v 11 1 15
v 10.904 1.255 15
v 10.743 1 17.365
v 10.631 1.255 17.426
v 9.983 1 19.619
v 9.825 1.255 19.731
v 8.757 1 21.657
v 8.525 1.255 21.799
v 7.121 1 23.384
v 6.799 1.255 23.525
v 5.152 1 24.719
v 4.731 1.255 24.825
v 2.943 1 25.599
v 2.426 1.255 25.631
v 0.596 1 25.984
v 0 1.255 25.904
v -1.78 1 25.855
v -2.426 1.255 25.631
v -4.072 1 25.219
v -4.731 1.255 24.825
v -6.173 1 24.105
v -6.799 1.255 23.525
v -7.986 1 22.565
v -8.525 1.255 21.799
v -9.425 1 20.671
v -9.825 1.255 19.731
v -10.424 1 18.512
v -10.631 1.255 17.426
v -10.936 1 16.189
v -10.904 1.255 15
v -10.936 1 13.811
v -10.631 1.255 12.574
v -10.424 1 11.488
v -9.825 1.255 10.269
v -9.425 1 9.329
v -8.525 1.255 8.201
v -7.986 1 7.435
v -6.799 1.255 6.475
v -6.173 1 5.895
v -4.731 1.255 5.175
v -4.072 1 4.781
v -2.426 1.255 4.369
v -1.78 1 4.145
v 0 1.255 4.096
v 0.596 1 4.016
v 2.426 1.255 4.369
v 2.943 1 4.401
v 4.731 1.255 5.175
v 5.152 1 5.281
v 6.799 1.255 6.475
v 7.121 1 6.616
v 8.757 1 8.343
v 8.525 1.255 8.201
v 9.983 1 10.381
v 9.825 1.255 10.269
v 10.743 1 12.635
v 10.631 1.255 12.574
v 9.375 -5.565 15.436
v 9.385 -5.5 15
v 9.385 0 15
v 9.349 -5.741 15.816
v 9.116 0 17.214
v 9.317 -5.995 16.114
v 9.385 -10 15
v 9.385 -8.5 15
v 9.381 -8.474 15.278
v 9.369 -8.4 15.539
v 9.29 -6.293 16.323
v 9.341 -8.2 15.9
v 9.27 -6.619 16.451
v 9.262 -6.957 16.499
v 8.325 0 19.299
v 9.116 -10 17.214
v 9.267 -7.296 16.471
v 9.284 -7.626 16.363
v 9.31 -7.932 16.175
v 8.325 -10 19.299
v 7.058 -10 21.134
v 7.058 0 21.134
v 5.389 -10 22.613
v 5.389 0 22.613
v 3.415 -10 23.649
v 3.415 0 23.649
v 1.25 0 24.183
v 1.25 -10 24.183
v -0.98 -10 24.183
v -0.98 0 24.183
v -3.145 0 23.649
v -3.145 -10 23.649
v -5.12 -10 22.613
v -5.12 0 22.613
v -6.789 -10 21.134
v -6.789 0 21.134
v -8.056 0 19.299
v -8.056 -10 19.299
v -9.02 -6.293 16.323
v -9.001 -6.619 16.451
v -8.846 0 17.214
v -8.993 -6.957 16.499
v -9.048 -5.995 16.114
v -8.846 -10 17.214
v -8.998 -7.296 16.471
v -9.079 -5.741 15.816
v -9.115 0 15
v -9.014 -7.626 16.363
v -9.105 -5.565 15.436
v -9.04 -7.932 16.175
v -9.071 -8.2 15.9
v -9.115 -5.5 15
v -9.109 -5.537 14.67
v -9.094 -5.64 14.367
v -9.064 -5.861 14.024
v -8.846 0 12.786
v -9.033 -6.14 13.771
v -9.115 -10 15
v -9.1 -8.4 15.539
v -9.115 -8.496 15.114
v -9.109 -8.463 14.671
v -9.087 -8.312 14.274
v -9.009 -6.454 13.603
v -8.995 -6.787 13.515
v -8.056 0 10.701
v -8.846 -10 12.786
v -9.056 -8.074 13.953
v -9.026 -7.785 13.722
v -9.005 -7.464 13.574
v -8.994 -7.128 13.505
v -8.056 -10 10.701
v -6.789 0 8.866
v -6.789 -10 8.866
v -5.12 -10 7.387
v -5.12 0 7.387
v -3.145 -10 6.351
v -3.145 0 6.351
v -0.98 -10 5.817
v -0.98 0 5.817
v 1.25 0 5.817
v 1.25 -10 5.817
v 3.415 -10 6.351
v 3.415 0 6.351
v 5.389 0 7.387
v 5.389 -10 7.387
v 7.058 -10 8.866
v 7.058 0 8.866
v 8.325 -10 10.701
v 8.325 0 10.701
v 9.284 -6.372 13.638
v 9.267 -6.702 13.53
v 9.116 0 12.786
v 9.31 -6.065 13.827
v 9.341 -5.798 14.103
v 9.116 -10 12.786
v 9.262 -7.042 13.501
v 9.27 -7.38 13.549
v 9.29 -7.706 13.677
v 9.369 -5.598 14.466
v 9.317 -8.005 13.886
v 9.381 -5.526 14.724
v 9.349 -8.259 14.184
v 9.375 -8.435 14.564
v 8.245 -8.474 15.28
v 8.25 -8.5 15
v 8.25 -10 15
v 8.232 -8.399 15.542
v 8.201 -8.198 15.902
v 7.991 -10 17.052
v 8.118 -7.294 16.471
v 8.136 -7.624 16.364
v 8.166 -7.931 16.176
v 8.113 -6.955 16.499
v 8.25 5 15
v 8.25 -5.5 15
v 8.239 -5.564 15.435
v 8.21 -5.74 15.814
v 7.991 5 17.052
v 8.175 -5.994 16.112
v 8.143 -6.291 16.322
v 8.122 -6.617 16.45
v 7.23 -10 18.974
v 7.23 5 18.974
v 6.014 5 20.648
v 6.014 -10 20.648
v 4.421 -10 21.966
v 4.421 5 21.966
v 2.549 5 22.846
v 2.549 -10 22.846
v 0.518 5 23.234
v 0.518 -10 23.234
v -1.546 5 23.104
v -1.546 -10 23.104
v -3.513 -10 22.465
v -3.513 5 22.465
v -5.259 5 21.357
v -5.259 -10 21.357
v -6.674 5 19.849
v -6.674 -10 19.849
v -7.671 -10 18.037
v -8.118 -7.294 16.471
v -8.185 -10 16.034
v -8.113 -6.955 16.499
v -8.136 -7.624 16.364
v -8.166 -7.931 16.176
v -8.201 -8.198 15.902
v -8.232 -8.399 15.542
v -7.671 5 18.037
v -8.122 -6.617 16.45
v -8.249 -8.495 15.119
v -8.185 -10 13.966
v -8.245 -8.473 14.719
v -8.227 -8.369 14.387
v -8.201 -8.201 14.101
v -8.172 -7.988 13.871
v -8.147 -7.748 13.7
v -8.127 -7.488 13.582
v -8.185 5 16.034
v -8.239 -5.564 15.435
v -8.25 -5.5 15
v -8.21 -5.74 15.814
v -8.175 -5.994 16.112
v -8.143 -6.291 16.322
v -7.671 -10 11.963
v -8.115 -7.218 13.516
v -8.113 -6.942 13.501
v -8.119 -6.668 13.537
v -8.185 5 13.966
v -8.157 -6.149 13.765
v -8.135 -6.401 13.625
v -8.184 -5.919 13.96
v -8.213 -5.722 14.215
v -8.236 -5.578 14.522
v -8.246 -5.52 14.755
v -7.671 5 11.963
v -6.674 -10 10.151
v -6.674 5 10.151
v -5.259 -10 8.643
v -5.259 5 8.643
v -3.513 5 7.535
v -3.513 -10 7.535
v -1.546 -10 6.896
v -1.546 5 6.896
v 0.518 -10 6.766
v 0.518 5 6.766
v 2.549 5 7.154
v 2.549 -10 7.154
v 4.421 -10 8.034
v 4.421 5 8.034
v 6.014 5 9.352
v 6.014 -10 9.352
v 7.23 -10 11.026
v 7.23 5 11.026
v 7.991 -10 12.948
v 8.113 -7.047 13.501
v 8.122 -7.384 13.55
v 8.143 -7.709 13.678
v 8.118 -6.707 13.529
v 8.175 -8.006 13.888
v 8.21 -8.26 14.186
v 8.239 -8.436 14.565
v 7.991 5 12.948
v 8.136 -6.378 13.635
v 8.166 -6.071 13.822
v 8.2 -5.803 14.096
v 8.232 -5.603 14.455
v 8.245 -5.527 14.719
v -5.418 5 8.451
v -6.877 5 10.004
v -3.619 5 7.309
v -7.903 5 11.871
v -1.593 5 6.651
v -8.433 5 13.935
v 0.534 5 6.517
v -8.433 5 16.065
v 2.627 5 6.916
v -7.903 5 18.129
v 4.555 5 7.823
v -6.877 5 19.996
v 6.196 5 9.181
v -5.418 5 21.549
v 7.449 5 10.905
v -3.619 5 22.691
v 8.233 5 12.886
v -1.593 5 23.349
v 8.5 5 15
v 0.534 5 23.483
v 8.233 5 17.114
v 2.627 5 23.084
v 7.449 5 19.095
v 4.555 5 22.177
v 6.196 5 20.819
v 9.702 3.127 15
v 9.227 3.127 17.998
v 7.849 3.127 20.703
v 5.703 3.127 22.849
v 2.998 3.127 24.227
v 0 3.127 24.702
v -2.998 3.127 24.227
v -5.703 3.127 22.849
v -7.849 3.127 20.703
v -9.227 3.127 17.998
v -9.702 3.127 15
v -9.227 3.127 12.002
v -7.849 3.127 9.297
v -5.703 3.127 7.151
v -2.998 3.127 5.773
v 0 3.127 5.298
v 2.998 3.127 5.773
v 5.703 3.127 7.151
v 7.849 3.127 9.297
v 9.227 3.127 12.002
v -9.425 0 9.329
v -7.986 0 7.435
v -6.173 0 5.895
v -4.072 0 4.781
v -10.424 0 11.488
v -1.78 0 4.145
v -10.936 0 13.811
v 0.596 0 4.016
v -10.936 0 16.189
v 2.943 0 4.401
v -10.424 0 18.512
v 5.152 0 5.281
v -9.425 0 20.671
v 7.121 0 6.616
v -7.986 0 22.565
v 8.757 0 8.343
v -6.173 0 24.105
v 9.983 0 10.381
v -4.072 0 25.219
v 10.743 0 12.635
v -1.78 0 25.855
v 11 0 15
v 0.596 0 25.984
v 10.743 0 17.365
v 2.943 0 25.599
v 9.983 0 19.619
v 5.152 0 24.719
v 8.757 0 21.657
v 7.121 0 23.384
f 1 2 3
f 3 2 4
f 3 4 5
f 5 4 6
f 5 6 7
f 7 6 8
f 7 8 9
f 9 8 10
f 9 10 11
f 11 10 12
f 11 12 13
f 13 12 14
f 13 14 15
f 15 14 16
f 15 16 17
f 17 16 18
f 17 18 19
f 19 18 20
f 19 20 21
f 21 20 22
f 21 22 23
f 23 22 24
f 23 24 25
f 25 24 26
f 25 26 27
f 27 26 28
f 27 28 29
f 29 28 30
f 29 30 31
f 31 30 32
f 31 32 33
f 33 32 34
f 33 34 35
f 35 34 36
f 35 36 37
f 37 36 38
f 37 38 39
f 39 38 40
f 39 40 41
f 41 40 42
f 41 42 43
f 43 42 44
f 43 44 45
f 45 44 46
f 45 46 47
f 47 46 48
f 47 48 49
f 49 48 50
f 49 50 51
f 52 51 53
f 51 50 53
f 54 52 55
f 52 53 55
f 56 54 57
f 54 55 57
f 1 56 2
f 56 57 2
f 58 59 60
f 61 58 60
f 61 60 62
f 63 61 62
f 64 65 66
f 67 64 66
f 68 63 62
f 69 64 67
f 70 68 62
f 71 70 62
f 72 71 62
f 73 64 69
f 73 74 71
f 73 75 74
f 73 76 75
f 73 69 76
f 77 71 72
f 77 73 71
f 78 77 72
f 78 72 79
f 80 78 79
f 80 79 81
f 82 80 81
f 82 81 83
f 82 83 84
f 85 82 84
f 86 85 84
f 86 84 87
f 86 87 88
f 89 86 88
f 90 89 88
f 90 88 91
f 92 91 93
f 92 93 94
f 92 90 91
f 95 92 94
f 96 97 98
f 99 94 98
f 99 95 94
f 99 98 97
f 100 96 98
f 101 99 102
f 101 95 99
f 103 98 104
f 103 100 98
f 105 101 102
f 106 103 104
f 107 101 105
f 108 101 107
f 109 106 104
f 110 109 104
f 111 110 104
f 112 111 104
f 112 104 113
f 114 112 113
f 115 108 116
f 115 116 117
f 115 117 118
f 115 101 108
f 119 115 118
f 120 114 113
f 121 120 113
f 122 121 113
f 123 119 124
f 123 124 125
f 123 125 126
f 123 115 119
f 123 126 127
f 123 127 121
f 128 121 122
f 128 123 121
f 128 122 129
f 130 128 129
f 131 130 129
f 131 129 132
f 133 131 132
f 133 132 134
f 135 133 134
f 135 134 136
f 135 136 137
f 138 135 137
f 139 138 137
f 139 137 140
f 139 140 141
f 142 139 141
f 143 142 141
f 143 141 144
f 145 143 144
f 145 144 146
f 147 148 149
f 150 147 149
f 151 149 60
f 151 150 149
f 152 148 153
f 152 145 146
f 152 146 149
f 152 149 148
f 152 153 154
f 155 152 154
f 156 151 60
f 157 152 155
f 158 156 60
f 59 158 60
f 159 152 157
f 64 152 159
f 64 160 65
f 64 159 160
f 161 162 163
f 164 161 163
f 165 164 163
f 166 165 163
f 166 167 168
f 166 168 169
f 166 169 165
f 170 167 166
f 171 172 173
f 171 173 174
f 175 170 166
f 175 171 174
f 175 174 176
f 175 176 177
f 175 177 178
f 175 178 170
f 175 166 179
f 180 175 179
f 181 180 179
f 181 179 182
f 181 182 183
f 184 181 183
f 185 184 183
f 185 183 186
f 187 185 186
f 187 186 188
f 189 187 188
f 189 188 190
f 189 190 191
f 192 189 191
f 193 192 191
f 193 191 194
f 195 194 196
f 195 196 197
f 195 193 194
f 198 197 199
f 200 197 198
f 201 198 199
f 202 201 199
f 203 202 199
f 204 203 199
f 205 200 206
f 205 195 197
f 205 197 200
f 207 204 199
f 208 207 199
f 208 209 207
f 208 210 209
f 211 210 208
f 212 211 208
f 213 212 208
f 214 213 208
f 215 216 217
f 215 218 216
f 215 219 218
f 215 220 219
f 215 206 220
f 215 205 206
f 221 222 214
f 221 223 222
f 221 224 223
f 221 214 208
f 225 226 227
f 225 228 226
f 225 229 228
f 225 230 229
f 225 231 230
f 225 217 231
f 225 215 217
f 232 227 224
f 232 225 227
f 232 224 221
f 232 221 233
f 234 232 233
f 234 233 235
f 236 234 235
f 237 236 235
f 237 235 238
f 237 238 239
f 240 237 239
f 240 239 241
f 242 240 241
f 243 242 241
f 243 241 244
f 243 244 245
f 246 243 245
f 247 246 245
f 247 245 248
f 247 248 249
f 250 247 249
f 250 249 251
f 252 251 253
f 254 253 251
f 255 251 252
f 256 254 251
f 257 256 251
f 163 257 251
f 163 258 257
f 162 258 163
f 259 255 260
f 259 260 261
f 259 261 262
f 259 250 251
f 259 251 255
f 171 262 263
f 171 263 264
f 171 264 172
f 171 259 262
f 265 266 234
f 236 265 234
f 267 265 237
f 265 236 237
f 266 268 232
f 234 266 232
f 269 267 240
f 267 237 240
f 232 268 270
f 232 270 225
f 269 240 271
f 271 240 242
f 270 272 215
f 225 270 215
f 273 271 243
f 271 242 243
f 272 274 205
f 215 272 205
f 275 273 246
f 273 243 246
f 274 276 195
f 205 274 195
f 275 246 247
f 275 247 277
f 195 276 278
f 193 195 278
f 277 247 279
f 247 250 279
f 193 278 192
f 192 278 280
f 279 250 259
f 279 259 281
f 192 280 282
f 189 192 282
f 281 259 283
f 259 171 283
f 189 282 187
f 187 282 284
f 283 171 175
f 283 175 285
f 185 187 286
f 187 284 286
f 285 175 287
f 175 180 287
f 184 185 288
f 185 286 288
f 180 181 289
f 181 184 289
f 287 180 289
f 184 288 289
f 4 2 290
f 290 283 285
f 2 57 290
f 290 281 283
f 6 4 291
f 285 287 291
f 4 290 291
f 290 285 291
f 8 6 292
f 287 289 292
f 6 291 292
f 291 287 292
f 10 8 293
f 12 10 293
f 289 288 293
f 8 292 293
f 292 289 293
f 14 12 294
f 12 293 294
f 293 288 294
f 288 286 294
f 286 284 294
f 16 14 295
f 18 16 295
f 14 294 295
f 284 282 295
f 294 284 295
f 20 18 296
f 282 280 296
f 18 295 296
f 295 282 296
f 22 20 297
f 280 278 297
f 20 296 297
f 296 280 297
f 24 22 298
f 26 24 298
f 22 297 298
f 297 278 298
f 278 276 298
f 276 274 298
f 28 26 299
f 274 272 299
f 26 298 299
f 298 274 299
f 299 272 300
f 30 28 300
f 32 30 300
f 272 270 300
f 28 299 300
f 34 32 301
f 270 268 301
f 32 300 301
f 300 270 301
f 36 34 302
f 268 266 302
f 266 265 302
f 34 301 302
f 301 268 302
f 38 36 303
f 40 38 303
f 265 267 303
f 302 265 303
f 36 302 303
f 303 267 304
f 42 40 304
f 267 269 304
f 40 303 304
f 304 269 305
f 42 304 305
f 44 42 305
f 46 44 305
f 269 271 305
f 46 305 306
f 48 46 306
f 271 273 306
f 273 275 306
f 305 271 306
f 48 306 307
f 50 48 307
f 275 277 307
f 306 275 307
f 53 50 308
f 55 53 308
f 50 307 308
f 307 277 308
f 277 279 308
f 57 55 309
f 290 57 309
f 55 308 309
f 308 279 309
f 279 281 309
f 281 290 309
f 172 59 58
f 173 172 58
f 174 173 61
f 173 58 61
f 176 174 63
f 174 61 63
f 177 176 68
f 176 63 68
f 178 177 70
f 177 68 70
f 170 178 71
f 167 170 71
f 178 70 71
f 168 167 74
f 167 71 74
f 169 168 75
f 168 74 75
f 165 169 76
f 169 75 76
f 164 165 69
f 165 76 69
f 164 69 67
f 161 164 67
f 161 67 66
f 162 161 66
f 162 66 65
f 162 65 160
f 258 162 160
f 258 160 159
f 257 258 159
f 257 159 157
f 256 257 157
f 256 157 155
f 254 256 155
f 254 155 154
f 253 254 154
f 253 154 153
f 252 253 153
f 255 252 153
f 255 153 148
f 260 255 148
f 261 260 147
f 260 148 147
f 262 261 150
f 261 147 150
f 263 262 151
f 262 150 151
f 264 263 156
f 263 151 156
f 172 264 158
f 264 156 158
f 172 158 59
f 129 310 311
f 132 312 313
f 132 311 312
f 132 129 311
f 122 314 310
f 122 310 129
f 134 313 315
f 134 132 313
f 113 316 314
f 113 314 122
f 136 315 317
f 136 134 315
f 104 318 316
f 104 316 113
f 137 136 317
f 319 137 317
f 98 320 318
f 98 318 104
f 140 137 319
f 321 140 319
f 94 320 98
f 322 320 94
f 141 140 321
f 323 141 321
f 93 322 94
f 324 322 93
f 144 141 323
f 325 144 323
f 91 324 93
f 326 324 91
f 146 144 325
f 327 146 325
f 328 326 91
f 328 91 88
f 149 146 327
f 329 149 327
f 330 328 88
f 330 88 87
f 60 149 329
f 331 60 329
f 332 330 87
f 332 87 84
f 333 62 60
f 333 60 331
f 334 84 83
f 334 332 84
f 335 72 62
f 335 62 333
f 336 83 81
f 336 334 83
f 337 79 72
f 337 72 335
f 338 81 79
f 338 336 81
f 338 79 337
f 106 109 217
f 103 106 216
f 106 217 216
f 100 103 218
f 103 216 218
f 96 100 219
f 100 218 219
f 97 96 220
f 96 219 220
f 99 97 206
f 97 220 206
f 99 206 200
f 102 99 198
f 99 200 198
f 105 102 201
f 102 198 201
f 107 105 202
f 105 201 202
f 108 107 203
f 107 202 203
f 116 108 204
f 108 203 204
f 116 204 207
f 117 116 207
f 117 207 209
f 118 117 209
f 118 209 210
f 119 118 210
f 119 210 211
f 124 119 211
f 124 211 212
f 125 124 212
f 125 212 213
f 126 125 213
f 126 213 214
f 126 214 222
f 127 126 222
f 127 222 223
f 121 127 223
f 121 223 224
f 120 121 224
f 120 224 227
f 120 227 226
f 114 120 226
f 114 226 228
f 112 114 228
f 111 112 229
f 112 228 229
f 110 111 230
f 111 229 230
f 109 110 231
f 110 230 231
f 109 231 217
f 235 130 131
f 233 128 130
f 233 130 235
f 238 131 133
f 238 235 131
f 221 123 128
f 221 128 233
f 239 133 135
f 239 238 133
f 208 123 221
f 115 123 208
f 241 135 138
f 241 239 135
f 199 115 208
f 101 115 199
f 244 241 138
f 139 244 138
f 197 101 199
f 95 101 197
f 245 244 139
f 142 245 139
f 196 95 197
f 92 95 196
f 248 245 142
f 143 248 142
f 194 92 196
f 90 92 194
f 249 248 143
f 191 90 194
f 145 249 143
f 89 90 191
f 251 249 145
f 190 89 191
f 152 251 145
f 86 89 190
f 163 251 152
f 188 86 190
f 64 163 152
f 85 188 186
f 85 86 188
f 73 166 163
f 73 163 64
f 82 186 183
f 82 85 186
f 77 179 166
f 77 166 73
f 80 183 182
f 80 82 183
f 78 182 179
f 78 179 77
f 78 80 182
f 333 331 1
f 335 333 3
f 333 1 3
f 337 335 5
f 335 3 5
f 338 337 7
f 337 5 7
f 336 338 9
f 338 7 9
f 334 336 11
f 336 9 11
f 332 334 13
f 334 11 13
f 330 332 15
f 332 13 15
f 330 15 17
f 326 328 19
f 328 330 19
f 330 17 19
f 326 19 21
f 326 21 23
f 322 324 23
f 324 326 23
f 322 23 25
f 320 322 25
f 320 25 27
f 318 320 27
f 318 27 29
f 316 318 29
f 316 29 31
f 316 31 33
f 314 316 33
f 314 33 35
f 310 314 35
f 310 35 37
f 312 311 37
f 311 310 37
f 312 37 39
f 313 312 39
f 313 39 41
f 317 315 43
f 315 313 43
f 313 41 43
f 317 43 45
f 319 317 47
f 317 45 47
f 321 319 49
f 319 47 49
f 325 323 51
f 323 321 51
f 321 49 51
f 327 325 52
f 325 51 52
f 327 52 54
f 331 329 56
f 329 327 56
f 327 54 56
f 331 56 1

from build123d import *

# Parameters (mm, degrees)
SKETCH013_R      = 11
SKETCH013_R_2    = 8.25
PAD007_DEPTH     = 15
SKETCH014_R      = 11.25
SKETCH014_R_2    = 9.25
POCKET006_DEPTH  = 12
CHAMFER006_SIZE2 = 1.5
CHAMFER006_SIZE  = 4
SKETCH015_R      = 1.25
HOLE_DEPTH       = 25
CHAMFER008_SIZE2 = 1
CHAMFER008_SIZE  = 4
SKETCH054_R      = 1.5
POCKET021_DEPTH  = 20


with BuildPart() as part:
    # Sketch013 → Pad007 (new body)
    with BuildSketch(Plane.XZ.offset(-10)):
        with Locations((0, 15)):
            Circle(SKETCH013_R)
        with Locations((0, 15)):
            Circle(SKETCH013_R_2, mode=Mode.SUBTRACT)
    extrude(amount=PAD007_DEPTH)

    # Sketch014 → Pocket006 (cut)
    with BuildSketch(Plane.XZ.offset(7)):
        with Locations((0.134772, 15)):
            Circle(SKETCH014_R)
        with Locations((0.134772, 15)):
            Circle(SKETCH014_R_2, mode=Mode.SUBTRACT)
    extrude(amount=-POCKET006_DEPTH, mode=Mode.SUBTRACT)

    # Chamfer006
    chamfer006_edges = [part.edges().sort_by_distance(p)[0] for p in [
        (-11, 10, 15),
    ]]
    chamfer006_side = part.faces().sort_by_distance((-11, 7.5, 15))[0]
    chamfer(chamfer006_edges, length=CHAMFER006_SIZE, length2=CHAMFER006_SIZE2, reference=chamfer006_side)

    # Sketch015 → Hole (cut)
    with BuildSketch(Plane(origin=(0, 4, 5), x_dir=(1, 0, 0), z_dir=(0, 0, 1))):
        with Locations((0.028156, -7.033275)):
            Circle(SKETCH015_R)
    extrude(amount=-HOLE_DEPTH, mode=Mode.SUBTRACT)

    # Chamfer008
    chamfer008_edges = [part.edges().sort_by_distance(p)[0] for p in [
        (-9.5, 10, 15),
    ]]
    chamfer008_side = part.faces().sort_by_distance((-10.25, 8, 15))[0]
    chamfer(chamfer008_edges, length=CHAMFER008_SIZE, length2=CHAMFER008_SIZE2, reference=chamfer008_side)

    # Sketch054 → Pocket021 (cut)
    with BuildSketch(Plane.YZ.offset(10)):
        with Locations((-2, 15)):
            Circle(SKETCH054_R)
    extrude(amount=-POCKET021_DEPTH, mode=Mode.SUBTRACT)


with BuildPart() as part_1:
    # Body006 placement: moved
    add(part.part.moved(Location((0, -5, 0))))


solid = part_1.part
